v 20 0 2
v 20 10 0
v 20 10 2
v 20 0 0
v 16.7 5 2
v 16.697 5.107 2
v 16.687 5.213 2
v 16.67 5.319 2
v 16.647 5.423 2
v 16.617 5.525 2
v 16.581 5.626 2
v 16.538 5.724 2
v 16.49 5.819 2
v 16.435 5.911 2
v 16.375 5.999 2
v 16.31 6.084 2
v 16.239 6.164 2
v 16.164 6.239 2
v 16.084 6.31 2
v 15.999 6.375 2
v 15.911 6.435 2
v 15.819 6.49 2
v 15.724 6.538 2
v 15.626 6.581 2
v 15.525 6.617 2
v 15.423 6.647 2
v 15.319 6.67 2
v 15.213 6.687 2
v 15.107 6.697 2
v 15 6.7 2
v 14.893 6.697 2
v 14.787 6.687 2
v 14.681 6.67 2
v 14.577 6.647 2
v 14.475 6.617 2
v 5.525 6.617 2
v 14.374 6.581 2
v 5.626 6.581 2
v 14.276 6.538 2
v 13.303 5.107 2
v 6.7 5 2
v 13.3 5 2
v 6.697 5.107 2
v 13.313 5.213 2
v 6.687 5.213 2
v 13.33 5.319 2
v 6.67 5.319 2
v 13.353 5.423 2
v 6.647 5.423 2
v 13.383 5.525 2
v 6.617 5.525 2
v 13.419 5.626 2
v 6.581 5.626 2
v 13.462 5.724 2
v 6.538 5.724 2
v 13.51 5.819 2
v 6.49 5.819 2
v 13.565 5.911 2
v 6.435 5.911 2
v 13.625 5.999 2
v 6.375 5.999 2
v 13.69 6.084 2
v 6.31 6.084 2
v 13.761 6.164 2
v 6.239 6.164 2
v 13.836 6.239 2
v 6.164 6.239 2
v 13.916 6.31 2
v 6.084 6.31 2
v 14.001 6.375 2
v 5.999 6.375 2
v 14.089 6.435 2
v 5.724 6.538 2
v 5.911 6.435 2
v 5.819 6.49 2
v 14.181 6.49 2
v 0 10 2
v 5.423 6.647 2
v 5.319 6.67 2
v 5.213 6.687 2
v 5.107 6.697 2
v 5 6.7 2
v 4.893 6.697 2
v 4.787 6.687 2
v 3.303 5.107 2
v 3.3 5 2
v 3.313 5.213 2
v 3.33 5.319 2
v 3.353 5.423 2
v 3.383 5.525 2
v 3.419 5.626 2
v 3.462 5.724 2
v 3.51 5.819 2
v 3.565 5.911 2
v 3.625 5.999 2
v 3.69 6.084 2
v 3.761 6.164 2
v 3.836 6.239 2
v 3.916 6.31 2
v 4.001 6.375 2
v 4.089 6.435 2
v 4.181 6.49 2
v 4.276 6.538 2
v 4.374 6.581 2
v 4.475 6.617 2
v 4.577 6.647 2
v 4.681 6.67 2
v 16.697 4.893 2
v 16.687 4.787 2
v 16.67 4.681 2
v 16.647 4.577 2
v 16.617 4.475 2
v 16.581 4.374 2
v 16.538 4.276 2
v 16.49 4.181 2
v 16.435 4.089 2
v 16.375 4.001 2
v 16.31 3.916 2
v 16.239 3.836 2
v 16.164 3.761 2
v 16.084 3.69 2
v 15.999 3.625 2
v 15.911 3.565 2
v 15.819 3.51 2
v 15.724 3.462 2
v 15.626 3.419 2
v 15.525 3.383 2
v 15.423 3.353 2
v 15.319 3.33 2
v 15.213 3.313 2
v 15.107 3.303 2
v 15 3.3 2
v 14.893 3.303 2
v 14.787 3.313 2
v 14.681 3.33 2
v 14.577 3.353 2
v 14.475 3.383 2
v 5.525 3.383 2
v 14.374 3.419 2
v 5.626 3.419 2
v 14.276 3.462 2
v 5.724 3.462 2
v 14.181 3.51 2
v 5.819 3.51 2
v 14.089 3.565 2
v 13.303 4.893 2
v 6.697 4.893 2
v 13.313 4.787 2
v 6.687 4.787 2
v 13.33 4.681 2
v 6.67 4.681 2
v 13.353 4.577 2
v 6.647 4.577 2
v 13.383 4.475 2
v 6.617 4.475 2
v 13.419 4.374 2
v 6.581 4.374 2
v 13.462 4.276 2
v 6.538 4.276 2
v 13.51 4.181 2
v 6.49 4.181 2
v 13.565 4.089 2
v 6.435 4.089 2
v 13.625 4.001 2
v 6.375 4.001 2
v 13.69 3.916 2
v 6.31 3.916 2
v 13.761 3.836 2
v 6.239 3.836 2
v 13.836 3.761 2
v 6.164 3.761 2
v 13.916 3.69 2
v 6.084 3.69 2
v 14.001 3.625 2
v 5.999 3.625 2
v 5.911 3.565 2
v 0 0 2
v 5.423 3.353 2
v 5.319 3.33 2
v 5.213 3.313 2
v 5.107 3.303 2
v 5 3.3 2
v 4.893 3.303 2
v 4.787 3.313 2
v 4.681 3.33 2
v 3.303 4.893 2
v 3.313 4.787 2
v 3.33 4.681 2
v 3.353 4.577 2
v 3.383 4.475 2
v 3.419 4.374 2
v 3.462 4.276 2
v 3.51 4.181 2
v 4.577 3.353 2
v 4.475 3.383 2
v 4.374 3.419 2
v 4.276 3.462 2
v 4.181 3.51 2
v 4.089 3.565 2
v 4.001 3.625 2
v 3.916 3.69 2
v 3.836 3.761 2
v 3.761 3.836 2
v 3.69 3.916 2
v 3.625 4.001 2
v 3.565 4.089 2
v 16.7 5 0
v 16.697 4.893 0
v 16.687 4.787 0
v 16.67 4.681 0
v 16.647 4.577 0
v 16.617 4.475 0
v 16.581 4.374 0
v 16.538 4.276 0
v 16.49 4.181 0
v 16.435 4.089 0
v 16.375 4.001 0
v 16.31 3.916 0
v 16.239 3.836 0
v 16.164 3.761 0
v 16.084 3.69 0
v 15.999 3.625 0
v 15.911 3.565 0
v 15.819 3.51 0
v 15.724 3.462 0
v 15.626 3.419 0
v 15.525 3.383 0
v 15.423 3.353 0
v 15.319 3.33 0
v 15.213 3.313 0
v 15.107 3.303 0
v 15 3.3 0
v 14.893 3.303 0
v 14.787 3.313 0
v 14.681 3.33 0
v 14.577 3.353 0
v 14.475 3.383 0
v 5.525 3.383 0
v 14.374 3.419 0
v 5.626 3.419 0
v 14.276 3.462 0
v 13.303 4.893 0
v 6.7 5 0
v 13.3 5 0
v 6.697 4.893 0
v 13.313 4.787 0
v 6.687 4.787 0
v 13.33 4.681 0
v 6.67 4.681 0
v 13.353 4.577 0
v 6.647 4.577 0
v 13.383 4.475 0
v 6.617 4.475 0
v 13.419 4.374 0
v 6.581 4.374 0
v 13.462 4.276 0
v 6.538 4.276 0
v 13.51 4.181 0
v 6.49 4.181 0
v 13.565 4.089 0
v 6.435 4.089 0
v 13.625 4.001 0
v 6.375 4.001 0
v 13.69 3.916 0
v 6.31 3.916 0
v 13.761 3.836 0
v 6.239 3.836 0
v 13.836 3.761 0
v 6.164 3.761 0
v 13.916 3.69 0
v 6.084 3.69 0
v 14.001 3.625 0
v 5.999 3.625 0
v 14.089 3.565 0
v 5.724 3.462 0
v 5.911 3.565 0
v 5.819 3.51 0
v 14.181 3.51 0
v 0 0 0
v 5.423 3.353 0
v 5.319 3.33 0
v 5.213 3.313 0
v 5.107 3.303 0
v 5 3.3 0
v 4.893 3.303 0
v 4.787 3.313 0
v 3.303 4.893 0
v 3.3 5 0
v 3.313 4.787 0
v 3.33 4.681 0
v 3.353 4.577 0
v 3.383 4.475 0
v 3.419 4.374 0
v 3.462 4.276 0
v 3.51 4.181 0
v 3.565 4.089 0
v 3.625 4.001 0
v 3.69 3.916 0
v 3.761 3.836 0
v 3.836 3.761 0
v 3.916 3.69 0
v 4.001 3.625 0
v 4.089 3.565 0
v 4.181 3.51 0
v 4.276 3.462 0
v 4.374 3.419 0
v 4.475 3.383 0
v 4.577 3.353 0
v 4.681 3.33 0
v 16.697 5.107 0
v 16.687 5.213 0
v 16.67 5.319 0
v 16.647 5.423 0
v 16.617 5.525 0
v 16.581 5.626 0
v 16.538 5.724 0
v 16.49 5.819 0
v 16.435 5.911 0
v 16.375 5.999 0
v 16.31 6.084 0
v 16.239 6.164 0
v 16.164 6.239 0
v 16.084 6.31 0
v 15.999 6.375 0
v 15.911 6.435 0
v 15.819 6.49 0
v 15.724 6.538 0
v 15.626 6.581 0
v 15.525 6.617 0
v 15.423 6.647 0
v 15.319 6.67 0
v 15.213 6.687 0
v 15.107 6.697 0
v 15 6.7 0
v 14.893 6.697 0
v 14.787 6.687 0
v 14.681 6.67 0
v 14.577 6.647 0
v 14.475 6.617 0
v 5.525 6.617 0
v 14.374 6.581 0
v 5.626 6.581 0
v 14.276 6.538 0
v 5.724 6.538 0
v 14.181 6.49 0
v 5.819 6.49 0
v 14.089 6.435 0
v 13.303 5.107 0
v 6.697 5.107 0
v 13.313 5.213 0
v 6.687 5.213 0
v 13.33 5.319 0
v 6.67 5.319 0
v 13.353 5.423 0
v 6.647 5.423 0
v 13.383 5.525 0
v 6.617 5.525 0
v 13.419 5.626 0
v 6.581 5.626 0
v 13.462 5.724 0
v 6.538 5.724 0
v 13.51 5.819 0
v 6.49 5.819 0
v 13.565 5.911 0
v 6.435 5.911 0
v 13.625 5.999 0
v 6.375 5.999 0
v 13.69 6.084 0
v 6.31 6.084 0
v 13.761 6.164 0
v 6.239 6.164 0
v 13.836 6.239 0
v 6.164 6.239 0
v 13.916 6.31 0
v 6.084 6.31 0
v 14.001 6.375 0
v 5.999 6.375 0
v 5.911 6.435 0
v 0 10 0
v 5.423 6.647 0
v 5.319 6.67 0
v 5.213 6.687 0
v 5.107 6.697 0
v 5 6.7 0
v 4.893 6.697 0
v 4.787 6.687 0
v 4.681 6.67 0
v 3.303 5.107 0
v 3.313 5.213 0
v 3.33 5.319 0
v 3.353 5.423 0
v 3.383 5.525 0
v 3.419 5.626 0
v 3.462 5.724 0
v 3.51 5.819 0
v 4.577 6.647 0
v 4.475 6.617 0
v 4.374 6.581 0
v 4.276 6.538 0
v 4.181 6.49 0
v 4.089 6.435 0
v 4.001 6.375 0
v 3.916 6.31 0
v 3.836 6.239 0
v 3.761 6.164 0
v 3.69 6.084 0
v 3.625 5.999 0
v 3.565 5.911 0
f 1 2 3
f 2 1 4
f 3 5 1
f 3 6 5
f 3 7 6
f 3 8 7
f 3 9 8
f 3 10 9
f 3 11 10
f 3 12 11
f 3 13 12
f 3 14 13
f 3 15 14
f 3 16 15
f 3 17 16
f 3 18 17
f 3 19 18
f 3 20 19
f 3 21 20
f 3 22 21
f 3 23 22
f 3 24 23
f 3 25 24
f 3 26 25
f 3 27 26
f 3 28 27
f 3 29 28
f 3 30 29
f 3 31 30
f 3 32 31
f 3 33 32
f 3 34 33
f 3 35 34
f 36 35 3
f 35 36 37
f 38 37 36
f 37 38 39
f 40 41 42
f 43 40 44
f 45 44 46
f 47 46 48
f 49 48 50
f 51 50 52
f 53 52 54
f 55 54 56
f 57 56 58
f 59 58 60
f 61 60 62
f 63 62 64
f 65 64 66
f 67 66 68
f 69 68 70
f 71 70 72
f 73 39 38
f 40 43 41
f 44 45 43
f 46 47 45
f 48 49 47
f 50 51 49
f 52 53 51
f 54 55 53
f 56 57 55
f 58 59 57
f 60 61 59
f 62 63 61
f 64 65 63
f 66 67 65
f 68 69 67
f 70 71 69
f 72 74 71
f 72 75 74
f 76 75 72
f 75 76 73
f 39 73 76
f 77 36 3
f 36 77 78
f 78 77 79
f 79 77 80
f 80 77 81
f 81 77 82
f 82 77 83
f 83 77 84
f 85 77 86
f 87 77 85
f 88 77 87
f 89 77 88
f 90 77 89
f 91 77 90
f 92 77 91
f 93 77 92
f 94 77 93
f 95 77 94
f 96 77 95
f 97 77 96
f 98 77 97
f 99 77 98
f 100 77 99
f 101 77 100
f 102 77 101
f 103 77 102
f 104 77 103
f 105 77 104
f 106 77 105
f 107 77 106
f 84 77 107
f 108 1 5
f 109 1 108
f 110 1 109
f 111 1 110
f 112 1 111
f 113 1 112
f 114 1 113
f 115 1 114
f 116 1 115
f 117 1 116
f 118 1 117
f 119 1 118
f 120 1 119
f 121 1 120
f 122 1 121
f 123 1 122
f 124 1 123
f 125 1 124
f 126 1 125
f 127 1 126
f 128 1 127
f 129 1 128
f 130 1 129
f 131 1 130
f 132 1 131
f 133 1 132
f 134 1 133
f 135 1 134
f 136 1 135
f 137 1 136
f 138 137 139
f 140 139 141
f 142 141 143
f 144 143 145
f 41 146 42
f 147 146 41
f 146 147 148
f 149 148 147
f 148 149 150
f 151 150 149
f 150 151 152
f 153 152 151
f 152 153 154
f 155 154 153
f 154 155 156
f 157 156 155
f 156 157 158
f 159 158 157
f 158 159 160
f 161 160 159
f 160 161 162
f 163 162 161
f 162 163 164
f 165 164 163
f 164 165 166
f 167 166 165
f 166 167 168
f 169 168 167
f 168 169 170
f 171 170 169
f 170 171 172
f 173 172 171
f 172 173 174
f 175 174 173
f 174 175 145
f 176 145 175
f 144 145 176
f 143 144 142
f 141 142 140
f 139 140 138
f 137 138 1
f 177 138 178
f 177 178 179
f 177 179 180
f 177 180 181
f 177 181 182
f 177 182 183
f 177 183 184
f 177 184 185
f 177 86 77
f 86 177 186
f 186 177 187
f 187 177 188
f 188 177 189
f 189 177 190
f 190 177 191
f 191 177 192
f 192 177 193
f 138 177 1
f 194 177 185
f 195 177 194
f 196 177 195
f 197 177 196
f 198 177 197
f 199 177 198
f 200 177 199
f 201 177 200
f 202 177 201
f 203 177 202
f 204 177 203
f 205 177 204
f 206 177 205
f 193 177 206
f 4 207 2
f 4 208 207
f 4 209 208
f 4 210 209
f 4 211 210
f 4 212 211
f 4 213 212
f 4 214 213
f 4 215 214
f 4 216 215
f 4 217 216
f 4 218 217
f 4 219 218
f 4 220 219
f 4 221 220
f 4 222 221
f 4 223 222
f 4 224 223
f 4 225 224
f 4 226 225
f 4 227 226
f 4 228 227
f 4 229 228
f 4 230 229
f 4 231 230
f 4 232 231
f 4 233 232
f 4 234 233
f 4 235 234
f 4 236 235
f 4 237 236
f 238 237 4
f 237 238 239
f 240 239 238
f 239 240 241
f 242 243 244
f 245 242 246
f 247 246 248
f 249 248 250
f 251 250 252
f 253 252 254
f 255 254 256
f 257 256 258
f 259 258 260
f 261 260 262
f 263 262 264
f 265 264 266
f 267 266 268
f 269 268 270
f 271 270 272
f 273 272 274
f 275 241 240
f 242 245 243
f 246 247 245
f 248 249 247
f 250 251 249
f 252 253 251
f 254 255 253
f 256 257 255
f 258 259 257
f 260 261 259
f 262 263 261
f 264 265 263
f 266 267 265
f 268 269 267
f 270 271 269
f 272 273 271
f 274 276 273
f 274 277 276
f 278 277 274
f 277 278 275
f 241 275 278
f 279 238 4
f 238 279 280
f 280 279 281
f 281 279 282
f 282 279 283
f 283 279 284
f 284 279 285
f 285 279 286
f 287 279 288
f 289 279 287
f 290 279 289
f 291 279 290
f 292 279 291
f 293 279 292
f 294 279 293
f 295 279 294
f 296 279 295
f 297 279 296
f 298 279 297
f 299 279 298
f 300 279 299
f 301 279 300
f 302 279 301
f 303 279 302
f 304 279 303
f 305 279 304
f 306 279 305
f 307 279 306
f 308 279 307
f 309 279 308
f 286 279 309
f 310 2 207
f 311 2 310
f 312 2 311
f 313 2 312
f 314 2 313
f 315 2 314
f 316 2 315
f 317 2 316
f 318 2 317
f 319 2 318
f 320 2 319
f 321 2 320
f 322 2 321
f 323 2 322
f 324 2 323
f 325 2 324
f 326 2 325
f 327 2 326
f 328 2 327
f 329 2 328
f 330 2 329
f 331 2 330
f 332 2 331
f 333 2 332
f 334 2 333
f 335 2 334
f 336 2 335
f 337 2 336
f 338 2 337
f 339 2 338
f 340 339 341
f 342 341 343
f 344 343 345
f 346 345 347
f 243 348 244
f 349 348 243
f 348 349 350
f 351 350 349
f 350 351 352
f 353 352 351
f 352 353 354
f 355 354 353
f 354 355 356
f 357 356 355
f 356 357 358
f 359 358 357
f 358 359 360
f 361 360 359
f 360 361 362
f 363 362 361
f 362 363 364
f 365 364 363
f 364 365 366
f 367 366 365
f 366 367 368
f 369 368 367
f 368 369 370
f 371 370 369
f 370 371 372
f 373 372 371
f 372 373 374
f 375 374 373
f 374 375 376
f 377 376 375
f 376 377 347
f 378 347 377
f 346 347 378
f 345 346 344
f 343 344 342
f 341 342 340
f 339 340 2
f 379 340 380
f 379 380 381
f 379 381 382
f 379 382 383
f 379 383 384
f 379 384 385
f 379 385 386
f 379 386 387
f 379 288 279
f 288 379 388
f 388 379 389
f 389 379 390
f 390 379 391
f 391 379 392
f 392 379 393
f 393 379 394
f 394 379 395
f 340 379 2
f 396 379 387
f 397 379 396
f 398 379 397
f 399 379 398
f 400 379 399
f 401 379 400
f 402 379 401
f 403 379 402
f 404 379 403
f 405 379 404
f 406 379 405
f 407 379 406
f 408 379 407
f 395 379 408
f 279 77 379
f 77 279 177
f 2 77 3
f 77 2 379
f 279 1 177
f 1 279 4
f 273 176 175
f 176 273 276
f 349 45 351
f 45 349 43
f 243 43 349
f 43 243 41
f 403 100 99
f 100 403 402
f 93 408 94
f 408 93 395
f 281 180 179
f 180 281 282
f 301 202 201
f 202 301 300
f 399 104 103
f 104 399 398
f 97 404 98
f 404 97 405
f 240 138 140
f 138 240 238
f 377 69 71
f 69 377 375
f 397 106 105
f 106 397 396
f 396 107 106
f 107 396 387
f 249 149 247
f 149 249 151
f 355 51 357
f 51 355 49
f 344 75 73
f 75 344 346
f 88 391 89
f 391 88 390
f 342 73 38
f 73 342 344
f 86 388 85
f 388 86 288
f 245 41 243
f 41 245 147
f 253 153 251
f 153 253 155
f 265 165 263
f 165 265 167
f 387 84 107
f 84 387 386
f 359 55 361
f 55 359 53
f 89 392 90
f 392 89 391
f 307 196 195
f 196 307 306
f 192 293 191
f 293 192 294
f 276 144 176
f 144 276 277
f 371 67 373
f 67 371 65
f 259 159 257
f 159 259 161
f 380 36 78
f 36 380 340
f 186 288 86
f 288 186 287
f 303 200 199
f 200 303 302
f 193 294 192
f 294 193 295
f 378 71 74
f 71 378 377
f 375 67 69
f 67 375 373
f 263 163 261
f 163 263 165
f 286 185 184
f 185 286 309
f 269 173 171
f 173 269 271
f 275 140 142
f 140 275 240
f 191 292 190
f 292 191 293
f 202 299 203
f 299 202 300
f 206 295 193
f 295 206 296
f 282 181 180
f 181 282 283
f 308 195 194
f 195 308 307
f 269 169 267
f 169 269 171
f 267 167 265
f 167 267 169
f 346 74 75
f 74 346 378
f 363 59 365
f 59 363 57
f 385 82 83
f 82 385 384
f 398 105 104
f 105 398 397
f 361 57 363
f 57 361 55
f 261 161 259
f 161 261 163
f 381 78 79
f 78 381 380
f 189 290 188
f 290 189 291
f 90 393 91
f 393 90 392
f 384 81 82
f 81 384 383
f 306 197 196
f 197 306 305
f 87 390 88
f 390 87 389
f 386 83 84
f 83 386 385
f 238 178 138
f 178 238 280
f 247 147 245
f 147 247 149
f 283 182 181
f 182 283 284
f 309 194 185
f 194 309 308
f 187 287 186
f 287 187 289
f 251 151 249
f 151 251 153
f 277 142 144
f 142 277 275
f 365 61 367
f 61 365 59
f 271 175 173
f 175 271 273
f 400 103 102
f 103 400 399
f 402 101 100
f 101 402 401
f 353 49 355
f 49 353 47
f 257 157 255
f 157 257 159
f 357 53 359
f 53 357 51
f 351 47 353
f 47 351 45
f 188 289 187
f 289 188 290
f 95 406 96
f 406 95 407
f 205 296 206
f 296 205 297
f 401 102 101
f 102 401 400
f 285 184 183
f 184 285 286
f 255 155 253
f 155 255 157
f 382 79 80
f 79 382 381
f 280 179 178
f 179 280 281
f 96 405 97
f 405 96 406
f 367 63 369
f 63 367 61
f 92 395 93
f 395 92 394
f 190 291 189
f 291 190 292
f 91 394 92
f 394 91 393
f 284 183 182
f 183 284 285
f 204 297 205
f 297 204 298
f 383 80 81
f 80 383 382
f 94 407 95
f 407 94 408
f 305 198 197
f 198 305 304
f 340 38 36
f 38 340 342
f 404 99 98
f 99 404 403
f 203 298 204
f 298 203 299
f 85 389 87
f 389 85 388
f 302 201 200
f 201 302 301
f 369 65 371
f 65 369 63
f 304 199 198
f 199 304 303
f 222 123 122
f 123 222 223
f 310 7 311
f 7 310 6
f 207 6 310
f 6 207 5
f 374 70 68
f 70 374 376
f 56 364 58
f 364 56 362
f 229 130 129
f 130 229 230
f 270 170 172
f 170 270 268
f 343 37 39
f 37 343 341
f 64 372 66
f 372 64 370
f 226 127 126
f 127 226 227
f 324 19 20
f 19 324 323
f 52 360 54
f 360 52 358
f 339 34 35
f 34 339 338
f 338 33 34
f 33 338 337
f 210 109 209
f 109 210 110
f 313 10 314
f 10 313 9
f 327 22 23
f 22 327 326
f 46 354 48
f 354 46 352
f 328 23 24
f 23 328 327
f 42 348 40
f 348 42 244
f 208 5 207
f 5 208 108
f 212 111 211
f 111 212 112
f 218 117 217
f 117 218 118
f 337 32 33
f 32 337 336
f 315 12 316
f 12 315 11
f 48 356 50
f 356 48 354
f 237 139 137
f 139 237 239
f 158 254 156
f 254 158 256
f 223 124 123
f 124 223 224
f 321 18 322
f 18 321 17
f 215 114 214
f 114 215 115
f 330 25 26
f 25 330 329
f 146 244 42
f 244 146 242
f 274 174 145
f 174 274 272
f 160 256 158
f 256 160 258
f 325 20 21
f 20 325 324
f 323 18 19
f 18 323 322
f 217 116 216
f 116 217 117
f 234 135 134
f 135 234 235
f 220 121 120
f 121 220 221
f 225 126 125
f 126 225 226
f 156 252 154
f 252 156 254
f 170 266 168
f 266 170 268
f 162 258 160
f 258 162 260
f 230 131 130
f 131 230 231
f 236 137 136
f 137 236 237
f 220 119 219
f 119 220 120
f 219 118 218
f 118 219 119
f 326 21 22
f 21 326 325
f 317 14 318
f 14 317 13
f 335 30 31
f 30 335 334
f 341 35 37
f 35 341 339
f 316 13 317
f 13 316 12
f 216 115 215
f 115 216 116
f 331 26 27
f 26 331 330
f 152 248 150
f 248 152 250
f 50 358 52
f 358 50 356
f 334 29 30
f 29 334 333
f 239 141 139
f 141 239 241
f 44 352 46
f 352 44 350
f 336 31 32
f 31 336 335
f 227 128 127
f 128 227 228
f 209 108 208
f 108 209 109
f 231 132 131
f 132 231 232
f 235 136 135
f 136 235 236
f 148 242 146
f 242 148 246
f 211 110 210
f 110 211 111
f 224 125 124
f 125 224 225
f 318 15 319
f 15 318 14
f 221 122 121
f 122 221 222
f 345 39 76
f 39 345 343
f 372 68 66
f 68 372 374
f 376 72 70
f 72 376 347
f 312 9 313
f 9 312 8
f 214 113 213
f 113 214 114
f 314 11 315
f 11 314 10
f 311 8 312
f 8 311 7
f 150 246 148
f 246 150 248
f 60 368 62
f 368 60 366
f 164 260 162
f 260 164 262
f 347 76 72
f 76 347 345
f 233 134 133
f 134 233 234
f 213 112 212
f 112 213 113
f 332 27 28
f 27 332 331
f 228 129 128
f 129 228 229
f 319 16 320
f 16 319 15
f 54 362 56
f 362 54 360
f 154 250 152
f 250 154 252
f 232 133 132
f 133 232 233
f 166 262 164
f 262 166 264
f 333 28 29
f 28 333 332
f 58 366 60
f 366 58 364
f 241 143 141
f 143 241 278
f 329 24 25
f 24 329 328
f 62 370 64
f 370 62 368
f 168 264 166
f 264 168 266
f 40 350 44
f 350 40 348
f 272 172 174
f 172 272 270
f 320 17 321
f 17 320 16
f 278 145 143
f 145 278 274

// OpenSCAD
$fn=100;

difference() {
    cube([20,10,2]);

    translate([5,5,-1])cylinder(d=3.4,h=4);
    translate([15,5,-1])cylinder(d=3.4,h=4);
} 
